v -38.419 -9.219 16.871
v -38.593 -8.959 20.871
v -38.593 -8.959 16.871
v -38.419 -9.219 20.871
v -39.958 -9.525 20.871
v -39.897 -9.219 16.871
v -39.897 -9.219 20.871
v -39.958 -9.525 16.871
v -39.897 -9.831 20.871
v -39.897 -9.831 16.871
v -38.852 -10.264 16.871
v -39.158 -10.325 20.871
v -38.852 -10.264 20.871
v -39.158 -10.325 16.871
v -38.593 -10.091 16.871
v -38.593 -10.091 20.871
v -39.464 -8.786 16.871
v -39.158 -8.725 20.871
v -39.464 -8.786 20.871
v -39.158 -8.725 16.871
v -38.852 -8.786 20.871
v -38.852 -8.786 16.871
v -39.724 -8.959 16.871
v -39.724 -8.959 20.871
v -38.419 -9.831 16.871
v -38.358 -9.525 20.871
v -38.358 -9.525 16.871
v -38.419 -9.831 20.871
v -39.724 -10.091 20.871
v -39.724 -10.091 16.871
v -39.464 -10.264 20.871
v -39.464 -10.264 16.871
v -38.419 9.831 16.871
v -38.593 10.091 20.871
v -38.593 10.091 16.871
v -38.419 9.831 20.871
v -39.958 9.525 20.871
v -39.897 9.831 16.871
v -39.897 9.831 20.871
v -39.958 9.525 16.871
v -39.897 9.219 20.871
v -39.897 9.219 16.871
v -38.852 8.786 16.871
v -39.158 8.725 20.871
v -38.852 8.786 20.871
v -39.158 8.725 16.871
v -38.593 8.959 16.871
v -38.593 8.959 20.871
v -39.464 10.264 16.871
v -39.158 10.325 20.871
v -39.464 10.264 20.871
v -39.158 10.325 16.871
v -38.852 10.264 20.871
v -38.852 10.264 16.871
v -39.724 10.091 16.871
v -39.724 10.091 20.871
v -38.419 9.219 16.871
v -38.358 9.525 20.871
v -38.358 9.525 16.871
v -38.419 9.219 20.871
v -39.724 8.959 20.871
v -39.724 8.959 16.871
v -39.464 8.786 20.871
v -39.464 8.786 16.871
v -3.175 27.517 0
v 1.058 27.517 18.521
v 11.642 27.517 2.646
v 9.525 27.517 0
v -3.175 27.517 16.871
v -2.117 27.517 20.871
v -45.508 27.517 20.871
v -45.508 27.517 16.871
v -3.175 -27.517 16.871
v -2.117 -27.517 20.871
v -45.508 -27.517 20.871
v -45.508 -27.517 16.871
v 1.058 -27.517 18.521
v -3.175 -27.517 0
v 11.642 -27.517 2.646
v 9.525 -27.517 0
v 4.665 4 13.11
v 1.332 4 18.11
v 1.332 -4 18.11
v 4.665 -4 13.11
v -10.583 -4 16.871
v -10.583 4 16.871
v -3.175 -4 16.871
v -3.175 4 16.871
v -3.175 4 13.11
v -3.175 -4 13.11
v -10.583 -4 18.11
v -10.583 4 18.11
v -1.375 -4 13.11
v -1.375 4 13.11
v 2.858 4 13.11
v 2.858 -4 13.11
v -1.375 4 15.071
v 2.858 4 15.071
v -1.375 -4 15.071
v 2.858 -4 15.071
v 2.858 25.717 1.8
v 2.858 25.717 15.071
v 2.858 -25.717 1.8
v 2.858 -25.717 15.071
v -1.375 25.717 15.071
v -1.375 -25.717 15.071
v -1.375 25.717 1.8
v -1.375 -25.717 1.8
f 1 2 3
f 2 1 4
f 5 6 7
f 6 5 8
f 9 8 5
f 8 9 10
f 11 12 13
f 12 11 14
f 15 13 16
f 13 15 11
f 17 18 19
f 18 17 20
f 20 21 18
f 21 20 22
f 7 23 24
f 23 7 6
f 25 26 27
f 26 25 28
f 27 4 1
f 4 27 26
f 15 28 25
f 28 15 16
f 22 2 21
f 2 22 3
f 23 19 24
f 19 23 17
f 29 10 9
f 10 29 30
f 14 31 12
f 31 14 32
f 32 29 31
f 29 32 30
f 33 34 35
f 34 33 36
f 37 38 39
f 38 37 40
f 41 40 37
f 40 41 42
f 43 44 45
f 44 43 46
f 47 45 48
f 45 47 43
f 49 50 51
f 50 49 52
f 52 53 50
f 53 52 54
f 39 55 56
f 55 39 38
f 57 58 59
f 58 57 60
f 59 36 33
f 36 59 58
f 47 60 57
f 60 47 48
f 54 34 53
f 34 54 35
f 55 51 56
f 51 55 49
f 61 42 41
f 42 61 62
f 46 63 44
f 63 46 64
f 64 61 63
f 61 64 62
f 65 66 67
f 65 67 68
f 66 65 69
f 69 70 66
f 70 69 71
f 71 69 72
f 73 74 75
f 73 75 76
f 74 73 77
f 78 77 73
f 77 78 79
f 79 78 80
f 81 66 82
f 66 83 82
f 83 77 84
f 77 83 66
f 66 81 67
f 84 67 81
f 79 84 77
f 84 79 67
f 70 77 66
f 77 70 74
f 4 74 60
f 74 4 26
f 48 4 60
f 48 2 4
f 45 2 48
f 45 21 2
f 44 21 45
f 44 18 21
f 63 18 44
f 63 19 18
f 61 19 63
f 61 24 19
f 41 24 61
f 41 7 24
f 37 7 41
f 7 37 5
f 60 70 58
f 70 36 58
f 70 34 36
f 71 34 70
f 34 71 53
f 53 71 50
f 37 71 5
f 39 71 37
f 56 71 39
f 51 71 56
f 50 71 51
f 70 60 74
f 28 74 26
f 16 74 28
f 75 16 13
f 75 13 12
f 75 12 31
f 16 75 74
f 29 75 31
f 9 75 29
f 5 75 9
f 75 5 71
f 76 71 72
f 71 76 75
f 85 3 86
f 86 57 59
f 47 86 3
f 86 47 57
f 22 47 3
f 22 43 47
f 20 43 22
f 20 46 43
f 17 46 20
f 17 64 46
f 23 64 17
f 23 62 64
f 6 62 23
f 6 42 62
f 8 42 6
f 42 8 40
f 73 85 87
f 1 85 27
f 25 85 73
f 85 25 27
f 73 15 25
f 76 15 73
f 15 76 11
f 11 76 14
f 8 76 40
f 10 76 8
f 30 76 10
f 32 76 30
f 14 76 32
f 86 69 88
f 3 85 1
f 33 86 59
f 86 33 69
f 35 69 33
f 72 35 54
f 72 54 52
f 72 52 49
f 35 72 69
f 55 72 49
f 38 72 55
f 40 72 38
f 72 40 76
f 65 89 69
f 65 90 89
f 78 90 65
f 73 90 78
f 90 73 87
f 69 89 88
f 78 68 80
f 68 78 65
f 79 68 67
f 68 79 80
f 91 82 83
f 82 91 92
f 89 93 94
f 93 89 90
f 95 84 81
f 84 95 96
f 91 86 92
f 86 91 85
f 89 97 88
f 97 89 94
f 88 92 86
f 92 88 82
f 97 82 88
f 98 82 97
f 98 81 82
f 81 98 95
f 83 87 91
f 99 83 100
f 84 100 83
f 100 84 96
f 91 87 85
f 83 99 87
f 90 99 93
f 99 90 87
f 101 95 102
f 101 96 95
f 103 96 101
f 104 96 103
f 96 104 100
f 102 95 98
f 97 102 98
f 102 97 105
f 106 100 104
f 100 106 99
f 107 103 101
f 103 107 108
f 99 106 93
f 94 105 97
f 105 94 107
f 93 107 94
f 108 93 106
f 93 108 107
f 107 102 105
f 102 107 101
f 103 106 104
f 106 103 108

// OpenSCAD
// file: ../../library/e7_all.scad
// ==========================================================================
//  e7_all.scad - include this one file. Preview, print plates and the report.
// ==========================================================================
include <e7_params.scad>
include <e7_body.scad>

// whole painted loco
module e7_preview() {
  // carbody in its paint bands
  for (i = [0:len(PAINT_BANDS) - 1]) {
    z0 = i == 0 ? -1 : p(PAINT_BANDS[i - 1][0]);
    z1 = i == len(PAINT_BANDS) - 1 ? 1000 : p(PAINT_BANDS[i][0]);
    color(PAINT_BANDS[i][1]) render(convexity = 8) e7_shell_solid([z0, z1]);
  }
  color(C_GLASS) e7_glass();
  color(C_LENS) let (d = nose_d_at_z(HEADLIGHT[0]))
    translate([XF - p(d) + p(HEADLIGHT[2]) + p(1.5), 0, p(HEADLIGHT[0])]) rotate([0, 90, 0]) cylinder(d = p(HEADLIGHT[1]) - 0.8, h = 0.5, $fn = 32);
  color(C_FRAME) { for (j = [1:NFRAME]) e7_frame_piece(j); e7_pilot(); e7_pilot_rear(); }
  for (tx = [TRK_X, -TRK_X]) translate([tx, 0, 0]) { color(C_TRUCK) e7_truck_frame(); color(C_WHEEL) e7_wheels(); }
}
// thin glass panes sitting in the window pockets (preview only)
module e7_glass() {
  intersection() { e7_loft(DET * 0.6); union() { e7_windshield_cut(); e7_side_cuts_windows_only(); } }
}
module e7_side_cuts_windows_only() {
  for (s = [-1, 1], w = CAB_WIN)
    translate([XF - p(w[1]), s * HW - (s > 0 ? DET : 3 - DET), p(w[2])]) cube([p(w[1] - w[0]), 3, p(w[3] - w[2])]);
}

// one print, laid out for the printer
module e7_plate(part) {
  sec = [for (k = [1:NSEC]) str("body_", k)];
  frm = [for (j = [1:NFRAME]) str("frame_", j)];
  if (is_num(search([part], sec)[0])) {
    k = search([part], sec)[0] + 1;
    // stand the section on its open bottom (skirt edge on the bed)
    translate([-sec_x0(k) - SEC_L / 2, 0, -Z_SKIRT]) e7_body_section(k);
  } else if (is_num(search([part], frm)[0])) {
    j = search([part], frm)[0] + 1;
    xs = concat([FRAME_X0], FRAME_SPLITS, [FRAME_X1]);
    translate([-(xs[j - 1] + xs[j]) / 2, 0, -Z_FRAME_BOT]) e7_frame_piece(j);
  } else if (part == "pilot") {
    translate([-XF, 0, 0]) rotate([0, 0, 0]) translate([0, 0, -p(5)]) e7_pilot();
  } else if (part == "pilot_rear") {
    translate([-XR, 0, 0]) translate([0, 0, -(CPL_Z - CPL_H / 2 - WALL)]) e7_pilot_rear();
  } else if (part == "truck") {
    // upside down, bolster on the bed
    translate([0, 0, Z_FRAME_BOT - 0.3]) rotate([180, 0, 0]) e7_truck_frame();
  } else {
    assert(false, str("unknown part '", part, "'"));
  }
}

module e7_report() {
  echo(str("MILW E7A ", ROAD_NO, " class ", CLASS, " - ", SC, " scale 1:", RATIO, ", paint ", PAINT));
  echo(str("  carbody ", round(BL), " mm long, ", round(2 * HW), " mm wide, roof ", round(Z_ROOF), " mm, cab ", round(Z_CAB), " mm above rail"));
  echo(str("  ", NSEC, " body sections of ", round(SEC_L), " mm; ", NFRAME, " frame pieces; trucks at +/- ", round(TRK_X), " mm"));
  echo(str("  body screws ", SCREW_BODY_NAME, " x ", 2 * len(BOSS_X), "; truck pivots ", PIVOT[1], "; wheels ", round(WHEEL_D * 10) / 10, " mm (bought)"));
}
// main file
// Milwaukee Road E7A, O scale 1-48 - print 6 of 8: pilot - front pilot with coupler pocket
// Render (F6), export STL, print. Settings: ../../library/e7_params.scad
// Whole loco preview and notes: ../../MILW_E7_Main.scad
SCALE_SEL = "O";
include <../../library/e7_all.scad>
e7_plate("pilot");
